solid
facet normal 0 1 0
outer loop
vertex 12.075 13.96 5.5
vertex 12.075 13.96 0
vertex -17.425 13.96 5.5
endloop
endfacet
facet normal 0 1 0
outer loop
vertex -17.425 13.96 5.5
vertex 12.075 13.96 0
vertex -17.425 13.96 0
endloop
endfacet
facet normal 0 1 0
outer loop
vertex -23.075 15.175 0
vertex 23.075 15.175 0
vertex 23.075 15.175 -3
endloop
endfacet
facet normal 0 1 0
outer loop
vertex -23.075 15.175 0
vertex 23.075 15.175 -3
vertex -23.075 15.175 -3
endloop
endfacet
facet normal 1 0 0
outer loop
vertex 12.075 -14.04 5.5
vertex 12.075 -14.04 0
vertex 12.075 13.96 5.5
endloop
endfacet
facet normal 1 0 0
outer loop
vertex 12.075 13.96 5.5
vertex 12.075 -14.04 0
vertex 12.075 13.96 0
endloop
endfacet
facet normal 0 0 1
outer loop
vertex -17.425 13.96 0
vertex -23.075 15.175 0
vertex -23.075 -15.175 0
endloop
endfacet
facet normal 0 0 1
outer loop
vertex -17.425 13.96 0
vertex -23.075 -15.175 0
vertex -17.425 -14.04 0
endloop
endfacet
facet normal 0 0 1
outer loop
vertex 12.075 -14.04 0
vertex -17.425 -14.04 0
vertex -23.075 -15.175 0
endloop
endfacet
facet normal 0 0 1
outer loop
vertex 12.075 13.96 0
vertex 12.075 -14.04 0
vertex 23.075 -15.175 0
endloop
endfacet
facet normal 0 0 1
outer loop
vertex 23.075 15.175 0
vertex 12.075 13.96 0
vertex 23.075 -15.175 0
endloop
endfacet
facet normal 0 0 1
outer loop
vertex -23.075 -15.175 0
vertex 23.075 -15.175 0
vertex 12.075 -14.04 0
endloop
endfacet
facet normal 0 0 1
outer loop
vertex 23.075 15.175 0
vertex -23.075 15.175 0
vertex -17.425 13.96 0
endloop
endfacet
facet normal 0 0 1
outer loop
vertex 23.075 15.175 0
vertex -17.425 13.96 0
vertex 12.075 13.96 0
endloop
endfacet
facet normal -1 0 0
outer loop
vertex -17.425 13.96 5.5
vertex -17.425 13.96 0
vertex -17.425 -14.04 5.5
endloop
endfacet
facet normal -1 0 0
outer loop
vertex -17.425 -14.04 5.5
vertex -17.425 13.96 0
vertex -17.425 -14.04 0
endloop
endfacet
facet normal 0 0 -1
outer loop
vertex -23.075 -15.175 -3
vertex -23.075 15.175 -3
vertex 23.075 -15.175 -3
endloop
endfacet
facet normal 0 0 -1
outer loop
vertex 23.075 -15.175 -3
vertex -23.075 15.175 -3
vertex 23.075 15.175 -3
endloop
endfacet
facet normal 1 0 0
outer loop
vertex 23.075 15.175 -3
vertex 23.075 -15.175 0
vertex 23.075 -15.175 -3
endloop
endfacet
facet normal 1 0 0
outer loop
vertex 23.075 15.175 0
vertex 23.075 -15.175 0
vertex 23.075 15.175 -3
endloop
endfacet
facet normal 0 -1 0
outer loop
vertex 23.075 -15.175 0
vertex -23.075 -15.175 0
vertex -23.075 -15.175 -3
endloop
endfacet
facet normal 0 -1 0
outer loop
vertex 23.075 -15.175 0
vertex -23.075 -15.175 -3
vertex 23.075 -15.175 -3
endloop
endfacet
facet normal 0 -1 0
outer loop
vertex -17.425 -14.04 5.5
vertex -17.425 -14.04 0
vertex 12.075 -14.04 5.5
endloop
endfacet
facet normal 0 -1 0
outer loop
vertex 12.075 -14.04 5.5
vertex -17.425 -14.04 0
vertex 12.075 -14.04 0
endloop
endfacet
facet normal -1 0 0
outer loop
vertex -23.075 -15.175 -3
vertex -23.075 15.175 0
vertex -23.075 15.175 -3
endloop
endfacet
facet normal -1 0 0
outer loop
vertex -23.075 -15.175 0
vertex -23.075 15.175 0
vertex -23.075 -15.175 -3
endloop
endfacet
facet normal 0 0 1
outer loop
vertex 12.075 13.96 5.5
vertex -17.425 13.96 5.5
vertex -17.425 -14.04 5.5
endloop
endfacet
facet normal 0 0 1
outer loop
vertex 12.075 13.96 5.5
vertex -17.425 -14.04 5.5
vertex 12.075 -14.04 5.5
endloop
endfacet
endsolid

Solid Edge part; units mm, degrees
sketch "Sketch1" plane through (0, 0, 0) normal (0, 0, 1) x (1, 0, 0)
  line L0 (23.075, -15.175) -> (23.075, 15.175)
  line L1 (23.075, 15.175) -> (-23.075, 15.175)
  line L2 (-23.075, 15.175) -> (-23.075, -15.175)
  line L3 (-23.075, -15.175) -> (23.075, -15.175)
extrude "Protrusion1" add sketch "Sketch1" against normal blind 3
sketch "Sketch2" plane through (0, 0, 0) normal (0, 0, 1) x (1, 0, 0)
  line L0 (-17.425, 13.9595) -> (-17.425, -14.0405)
  line L1 (-17.425, -14.0405) -> (12.075, -14.0405)
  line L2 (12.075, -14.0405) -> (12.075, 13.9595)
  line L3 (12.075, 13.9595) -> (-17.425, 13.9595)
extrude "ExtrudedProtrusion_2" add sketch "Sketch2" along normal blind 5.5
properties material "Glass, general industrial"
